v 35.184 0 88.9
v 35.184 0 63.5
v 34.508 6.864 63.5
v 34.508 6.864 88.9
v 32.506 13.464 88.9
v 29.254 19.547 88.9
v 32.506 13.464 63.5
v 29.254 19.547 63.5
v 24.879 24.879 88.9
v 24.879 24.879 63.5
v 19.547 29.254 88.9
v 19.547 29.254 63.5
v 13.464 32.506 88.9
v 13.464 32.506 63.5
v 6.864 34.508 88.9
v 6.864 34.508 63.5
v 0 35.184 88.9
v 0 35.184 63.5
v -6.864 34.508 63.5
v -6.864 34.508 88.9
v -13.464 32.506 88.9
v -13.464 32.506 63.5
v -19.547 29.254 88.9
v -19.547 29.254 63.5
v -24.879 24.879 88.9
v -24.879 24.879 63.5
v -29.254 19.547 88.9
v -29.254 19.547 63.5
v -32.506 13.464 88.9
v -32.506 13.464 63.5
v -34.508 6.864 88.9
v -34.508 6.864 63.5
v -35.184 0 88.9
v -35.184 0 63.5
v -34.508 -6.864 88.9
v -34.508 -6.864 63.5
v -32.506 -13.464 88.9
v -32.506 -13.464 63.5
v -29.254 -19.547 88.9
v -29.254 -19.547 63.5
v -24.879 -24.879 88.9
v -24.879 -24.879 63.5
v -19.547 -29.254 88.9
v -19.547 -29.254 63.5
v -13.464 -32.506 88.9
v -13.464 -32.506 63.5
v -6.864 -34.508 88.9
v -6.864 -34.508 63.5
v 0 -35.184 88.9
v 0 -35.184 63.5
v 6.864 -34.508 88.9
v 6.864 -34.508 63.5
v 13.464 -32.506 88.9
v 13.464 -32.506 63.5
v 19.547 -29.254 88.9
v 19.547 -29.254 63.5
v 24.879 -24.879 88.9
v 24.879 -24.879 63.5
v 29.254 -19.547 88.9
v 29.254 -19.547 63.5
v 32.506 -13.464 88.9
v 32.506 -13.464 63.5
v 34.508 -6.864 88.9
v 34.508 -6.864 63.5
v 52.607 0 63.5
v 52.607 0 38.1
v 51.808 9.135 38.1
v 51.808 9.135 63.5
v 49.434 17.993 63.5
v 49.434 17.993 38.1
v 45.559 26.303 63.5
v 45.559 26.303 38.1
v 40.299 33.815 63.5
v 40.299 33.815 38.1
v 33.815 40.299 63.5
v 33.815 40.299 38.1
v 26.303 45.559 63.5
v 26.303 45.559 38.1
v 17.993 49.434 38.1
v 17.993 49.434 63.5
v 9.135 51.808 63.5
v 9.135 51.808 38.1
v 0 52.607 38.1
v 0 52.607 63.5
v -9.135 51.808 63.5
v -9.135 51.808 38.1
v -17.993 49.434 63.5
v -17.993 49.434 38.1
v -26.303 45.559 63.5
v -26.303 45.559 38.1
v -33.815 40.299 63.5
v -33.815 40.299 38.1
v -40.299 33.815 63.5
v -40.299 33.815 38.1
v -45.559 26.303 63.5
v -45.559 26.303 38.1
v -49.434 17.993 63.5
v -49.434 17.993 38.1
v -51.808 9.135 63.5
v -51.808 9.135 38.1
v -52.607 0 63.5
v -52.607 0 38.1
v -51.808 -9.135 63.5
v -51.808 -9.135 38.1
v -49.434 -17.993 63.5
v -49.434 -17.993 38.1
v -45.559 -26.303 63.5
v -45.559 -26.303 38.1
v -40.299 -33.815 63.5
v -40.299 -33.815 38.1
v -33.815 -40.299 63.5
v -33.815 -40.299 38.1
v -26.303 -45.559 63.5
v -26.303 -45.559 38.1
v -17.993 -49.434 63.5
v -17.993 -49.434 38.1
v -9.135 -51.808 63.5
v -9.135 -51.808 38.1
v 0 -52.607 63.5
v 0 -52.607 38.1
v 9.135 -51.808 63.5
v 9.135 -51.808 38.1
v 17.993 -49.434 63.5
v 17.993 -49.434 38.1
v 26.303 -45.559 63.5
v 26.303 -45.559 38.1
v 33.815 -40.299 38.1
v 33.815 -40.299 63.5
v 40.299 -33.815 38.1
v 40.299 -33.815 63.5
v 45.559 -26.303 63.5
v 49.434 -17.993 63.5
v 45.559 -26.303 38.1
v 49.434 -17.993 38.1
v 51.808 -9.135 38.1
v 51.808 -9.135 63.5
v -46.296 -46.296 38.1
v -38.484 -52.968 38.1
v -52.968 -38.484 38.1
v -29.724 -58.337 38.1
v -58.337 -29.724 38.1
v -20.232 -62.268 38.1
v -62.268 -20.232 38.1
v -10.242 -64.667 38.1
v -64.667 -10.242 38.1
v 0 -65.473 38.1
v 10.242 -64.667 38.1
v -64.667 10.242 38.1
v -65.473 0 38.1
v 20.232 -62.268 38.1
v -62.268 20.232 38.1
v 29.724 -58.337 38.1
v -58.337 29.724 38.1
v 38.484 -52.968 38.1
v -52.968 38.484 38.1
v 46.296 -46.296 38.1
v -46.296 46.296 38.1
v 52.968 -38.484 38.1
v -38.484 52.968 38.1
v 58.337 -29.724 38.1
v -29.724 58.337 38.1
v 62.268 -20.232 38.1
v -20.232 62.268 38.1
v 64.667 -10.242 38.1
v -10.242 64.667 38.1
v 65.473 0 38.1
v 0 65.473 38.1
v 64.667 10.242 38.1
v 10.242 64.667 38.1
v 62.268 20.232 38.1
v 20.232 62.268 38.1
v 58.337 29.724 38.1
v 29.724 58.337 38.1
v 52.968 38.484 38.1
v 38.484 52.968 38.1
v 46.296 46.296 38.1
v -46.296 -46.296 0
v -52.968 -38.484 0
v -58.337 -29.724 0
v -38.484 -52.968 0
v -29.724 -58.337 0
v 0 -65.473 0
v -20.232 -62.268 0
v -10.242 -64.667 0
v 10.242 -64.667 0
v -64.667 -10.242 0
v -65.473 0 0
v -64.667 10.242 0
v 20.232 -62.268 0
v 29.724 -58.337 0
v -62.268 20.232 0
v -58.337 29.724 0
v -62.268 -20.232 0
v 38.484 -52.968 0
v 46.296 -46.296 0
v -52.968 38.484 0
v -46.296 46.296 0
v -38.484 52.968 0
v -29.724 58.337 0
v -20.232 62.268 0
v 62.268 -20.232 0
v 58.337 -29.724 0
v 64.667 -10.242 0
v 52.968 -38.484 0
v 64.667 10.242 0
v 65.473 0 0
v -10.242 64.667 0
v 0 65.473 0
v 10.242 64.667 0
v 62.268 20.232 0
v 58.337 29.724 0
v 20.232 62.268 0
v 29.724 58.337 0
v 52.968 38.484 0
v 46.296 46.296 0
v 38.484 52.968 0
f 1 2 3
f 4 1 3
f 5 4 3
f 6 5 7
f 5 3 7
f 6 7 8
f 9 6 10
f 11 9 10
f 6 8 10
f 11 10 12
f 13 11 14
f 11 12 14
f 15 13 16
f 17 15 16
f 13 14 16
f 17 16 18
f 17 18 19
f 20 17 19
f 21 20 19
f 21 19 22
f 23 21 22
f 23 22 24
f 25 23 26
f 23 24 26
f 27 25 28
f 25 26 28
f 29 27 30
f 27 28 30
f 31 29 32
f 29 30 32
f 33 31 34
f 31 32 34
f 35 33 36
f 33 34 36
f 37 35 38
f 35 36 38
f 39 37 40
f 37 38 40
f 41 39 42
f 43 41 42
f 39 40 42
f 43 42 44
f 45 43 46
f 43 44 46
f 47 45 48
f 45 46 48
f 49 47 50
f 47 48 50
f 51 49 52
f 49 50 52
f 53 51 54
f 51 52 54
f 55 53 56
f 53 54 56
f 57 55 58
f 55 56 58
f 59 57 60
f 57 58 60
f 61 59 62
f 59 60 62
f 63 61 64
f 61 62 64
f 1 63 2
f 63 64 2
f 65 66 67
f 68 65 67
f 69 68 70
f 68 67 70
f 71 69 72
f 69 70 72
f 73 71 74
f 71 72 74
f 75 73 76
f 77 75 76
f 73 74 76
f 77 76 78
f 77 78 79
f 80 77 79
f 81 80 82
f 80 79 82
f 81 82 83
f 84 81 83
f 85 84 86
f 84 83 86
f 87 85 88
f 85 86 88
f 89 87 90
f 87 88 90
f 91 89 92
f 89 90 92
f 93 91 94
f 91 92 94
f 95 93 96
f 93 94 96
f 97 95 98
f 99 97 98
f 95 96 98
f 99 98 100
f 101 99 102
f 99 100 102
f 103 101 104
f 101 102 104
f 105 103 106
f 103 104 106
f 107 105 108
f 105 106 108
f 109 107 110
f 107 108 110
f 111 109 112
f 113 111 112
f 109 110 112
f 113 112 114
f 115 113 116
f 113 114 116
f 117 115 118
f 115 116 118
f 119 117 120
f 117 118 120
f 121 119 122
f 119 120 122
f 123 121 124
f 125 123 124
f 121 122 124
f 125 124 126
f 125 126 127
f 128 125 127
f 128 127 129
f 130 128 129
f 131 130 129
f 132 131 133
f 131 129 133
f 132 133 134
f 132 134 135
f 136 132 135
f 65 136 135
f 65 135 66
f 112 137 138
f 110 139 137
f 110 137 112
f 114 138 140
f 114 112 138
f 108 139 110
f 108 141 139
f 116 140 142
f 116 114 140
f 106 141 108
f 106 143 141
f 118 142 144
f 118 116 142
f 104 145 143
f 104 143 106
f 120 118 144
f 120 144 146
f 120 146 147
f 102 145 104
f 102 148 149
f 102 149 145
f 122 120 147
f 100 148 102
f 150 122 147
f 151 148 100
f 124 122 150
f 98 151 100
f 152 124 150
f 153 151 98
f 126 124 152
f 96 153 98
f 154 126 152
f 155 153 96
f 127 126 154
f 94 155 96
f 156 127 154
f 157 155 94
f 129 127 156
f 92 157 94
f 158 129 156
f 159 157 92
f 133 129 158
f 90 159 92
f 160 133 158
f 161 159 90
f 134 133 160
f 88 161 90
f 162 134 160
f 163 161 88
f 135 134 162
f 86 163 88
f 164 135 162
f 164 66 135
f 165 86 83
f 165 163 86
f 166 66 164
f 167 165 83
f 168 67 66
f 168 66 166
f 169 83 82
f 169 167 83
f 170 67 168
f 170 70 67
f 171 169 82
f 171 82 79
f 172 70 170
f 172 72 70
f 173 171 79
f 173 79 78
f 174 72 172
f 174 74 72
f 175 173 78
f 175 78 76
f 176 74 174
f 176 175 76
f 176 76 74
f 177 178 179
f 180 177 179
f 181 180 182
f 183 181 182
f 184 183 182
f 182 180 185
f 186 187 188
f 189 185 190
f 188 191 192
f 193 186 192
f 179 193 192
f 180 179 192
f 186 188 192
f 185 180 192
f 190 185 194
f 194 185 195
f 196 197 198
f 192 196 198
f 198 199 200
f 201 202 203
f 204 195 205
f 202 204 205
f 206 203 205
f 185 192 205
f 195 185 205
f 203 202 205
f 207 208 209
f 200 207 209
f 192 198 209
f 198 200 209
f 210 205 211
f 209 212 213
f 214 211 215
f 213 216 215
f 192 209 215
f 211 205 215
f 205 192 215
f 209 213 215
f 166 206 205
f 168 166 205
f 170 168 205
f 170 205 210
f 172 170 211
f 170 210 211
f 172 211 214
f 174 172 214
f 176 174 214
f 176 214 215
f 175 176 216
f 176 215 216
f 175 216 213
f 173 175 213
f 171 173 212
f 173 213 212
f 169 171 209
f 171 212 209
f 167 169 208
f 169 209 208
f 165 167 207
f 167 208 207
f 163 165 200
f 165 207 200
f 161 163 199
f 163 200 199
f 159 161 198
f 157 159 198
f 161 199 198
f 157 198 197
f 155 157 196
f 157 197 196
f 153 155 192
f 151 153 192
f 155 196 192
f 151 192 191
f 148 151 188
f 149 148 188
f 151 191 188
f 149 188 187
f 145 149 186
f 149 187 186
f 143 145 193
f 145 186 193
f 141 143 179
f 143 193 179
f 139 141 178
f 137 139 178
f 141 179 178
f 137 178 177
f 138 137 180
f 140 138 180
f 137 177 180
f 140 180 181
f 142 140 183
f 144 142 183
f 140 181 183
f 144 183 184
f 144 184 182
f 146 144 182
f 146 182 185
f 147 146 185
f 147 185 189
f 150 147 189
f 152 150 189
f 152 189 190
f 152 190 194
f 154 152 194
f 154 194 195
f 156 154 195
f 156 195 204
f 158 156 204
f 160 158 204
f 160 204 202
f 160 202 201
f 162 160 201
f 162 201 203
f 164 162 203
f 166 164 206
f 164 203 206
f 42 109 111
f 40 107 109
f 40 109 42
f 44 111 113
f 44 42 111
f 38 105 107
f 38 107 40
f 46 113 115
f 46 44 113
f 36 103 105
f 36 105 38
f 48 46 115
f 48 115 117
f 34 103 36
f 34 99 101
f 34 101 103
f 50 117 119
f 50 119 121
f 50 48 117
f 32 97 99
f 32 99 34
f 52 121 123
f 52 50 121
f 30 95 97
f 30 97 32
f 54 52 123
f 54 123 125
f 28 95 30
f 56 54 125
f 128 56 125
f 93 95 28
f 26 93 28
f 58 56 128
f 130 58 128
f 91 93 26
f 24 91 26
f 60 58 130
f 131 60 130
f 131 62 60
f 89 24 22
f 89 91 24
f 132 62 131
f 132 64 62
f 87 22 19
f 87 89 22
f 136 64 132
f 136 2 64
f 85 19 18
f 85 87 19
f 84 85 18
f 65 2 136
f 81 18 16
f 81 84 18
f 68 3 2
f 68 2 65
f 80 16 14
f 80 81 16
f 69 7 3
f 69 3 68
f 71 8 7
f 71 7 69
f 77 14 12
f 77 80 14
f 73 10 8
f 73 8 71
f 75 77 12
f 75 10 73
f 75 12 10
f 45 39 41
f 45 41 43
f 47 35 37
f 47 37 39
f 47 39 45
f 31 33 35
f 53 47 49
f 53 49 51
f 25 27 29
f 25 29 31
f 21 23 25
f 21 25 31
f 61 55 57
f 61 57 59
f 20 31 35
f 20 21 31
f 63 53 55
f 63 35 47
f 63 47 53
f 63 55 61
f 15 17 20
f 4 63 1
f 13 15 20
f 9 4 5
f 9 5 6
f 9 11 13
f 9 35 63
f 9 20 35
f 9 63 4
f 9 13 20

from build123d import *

# Parameters (mm, degrees)
F0_R     = 65.4726096666
F1_DEPTH = 38.1
F2_R     = 52.6067732991
F3_DEPTH = 25.4
F4_R     = 35.1837218131
F5_DEPTH = 25.4


# Not quite as in the source:
# - the program builds the solid bodies; features that only make, move or delete a surface that nothing else refers to are left out


with BuildPart() as f1:
    # F0 (on Top) → F1 (new body)
    with BuildSketch(Plane.XY):
        Circle(F0_R)
    extrude(amount=F1_DEPTH)

    # F2 (on face) → F3 (join)
    with BuildSketch(Plane.XY.offset(38.1)):
        Circle(F2_R)
    extrude(amount=F3_DEPTH)

    # F4 (on face) → F5 (join)
    with BuildSketch(Plane.XY.offset(63.5)):
        Circle(F4_R)
    extrude(amount=F5_DEPTH)


solid = f1.part
